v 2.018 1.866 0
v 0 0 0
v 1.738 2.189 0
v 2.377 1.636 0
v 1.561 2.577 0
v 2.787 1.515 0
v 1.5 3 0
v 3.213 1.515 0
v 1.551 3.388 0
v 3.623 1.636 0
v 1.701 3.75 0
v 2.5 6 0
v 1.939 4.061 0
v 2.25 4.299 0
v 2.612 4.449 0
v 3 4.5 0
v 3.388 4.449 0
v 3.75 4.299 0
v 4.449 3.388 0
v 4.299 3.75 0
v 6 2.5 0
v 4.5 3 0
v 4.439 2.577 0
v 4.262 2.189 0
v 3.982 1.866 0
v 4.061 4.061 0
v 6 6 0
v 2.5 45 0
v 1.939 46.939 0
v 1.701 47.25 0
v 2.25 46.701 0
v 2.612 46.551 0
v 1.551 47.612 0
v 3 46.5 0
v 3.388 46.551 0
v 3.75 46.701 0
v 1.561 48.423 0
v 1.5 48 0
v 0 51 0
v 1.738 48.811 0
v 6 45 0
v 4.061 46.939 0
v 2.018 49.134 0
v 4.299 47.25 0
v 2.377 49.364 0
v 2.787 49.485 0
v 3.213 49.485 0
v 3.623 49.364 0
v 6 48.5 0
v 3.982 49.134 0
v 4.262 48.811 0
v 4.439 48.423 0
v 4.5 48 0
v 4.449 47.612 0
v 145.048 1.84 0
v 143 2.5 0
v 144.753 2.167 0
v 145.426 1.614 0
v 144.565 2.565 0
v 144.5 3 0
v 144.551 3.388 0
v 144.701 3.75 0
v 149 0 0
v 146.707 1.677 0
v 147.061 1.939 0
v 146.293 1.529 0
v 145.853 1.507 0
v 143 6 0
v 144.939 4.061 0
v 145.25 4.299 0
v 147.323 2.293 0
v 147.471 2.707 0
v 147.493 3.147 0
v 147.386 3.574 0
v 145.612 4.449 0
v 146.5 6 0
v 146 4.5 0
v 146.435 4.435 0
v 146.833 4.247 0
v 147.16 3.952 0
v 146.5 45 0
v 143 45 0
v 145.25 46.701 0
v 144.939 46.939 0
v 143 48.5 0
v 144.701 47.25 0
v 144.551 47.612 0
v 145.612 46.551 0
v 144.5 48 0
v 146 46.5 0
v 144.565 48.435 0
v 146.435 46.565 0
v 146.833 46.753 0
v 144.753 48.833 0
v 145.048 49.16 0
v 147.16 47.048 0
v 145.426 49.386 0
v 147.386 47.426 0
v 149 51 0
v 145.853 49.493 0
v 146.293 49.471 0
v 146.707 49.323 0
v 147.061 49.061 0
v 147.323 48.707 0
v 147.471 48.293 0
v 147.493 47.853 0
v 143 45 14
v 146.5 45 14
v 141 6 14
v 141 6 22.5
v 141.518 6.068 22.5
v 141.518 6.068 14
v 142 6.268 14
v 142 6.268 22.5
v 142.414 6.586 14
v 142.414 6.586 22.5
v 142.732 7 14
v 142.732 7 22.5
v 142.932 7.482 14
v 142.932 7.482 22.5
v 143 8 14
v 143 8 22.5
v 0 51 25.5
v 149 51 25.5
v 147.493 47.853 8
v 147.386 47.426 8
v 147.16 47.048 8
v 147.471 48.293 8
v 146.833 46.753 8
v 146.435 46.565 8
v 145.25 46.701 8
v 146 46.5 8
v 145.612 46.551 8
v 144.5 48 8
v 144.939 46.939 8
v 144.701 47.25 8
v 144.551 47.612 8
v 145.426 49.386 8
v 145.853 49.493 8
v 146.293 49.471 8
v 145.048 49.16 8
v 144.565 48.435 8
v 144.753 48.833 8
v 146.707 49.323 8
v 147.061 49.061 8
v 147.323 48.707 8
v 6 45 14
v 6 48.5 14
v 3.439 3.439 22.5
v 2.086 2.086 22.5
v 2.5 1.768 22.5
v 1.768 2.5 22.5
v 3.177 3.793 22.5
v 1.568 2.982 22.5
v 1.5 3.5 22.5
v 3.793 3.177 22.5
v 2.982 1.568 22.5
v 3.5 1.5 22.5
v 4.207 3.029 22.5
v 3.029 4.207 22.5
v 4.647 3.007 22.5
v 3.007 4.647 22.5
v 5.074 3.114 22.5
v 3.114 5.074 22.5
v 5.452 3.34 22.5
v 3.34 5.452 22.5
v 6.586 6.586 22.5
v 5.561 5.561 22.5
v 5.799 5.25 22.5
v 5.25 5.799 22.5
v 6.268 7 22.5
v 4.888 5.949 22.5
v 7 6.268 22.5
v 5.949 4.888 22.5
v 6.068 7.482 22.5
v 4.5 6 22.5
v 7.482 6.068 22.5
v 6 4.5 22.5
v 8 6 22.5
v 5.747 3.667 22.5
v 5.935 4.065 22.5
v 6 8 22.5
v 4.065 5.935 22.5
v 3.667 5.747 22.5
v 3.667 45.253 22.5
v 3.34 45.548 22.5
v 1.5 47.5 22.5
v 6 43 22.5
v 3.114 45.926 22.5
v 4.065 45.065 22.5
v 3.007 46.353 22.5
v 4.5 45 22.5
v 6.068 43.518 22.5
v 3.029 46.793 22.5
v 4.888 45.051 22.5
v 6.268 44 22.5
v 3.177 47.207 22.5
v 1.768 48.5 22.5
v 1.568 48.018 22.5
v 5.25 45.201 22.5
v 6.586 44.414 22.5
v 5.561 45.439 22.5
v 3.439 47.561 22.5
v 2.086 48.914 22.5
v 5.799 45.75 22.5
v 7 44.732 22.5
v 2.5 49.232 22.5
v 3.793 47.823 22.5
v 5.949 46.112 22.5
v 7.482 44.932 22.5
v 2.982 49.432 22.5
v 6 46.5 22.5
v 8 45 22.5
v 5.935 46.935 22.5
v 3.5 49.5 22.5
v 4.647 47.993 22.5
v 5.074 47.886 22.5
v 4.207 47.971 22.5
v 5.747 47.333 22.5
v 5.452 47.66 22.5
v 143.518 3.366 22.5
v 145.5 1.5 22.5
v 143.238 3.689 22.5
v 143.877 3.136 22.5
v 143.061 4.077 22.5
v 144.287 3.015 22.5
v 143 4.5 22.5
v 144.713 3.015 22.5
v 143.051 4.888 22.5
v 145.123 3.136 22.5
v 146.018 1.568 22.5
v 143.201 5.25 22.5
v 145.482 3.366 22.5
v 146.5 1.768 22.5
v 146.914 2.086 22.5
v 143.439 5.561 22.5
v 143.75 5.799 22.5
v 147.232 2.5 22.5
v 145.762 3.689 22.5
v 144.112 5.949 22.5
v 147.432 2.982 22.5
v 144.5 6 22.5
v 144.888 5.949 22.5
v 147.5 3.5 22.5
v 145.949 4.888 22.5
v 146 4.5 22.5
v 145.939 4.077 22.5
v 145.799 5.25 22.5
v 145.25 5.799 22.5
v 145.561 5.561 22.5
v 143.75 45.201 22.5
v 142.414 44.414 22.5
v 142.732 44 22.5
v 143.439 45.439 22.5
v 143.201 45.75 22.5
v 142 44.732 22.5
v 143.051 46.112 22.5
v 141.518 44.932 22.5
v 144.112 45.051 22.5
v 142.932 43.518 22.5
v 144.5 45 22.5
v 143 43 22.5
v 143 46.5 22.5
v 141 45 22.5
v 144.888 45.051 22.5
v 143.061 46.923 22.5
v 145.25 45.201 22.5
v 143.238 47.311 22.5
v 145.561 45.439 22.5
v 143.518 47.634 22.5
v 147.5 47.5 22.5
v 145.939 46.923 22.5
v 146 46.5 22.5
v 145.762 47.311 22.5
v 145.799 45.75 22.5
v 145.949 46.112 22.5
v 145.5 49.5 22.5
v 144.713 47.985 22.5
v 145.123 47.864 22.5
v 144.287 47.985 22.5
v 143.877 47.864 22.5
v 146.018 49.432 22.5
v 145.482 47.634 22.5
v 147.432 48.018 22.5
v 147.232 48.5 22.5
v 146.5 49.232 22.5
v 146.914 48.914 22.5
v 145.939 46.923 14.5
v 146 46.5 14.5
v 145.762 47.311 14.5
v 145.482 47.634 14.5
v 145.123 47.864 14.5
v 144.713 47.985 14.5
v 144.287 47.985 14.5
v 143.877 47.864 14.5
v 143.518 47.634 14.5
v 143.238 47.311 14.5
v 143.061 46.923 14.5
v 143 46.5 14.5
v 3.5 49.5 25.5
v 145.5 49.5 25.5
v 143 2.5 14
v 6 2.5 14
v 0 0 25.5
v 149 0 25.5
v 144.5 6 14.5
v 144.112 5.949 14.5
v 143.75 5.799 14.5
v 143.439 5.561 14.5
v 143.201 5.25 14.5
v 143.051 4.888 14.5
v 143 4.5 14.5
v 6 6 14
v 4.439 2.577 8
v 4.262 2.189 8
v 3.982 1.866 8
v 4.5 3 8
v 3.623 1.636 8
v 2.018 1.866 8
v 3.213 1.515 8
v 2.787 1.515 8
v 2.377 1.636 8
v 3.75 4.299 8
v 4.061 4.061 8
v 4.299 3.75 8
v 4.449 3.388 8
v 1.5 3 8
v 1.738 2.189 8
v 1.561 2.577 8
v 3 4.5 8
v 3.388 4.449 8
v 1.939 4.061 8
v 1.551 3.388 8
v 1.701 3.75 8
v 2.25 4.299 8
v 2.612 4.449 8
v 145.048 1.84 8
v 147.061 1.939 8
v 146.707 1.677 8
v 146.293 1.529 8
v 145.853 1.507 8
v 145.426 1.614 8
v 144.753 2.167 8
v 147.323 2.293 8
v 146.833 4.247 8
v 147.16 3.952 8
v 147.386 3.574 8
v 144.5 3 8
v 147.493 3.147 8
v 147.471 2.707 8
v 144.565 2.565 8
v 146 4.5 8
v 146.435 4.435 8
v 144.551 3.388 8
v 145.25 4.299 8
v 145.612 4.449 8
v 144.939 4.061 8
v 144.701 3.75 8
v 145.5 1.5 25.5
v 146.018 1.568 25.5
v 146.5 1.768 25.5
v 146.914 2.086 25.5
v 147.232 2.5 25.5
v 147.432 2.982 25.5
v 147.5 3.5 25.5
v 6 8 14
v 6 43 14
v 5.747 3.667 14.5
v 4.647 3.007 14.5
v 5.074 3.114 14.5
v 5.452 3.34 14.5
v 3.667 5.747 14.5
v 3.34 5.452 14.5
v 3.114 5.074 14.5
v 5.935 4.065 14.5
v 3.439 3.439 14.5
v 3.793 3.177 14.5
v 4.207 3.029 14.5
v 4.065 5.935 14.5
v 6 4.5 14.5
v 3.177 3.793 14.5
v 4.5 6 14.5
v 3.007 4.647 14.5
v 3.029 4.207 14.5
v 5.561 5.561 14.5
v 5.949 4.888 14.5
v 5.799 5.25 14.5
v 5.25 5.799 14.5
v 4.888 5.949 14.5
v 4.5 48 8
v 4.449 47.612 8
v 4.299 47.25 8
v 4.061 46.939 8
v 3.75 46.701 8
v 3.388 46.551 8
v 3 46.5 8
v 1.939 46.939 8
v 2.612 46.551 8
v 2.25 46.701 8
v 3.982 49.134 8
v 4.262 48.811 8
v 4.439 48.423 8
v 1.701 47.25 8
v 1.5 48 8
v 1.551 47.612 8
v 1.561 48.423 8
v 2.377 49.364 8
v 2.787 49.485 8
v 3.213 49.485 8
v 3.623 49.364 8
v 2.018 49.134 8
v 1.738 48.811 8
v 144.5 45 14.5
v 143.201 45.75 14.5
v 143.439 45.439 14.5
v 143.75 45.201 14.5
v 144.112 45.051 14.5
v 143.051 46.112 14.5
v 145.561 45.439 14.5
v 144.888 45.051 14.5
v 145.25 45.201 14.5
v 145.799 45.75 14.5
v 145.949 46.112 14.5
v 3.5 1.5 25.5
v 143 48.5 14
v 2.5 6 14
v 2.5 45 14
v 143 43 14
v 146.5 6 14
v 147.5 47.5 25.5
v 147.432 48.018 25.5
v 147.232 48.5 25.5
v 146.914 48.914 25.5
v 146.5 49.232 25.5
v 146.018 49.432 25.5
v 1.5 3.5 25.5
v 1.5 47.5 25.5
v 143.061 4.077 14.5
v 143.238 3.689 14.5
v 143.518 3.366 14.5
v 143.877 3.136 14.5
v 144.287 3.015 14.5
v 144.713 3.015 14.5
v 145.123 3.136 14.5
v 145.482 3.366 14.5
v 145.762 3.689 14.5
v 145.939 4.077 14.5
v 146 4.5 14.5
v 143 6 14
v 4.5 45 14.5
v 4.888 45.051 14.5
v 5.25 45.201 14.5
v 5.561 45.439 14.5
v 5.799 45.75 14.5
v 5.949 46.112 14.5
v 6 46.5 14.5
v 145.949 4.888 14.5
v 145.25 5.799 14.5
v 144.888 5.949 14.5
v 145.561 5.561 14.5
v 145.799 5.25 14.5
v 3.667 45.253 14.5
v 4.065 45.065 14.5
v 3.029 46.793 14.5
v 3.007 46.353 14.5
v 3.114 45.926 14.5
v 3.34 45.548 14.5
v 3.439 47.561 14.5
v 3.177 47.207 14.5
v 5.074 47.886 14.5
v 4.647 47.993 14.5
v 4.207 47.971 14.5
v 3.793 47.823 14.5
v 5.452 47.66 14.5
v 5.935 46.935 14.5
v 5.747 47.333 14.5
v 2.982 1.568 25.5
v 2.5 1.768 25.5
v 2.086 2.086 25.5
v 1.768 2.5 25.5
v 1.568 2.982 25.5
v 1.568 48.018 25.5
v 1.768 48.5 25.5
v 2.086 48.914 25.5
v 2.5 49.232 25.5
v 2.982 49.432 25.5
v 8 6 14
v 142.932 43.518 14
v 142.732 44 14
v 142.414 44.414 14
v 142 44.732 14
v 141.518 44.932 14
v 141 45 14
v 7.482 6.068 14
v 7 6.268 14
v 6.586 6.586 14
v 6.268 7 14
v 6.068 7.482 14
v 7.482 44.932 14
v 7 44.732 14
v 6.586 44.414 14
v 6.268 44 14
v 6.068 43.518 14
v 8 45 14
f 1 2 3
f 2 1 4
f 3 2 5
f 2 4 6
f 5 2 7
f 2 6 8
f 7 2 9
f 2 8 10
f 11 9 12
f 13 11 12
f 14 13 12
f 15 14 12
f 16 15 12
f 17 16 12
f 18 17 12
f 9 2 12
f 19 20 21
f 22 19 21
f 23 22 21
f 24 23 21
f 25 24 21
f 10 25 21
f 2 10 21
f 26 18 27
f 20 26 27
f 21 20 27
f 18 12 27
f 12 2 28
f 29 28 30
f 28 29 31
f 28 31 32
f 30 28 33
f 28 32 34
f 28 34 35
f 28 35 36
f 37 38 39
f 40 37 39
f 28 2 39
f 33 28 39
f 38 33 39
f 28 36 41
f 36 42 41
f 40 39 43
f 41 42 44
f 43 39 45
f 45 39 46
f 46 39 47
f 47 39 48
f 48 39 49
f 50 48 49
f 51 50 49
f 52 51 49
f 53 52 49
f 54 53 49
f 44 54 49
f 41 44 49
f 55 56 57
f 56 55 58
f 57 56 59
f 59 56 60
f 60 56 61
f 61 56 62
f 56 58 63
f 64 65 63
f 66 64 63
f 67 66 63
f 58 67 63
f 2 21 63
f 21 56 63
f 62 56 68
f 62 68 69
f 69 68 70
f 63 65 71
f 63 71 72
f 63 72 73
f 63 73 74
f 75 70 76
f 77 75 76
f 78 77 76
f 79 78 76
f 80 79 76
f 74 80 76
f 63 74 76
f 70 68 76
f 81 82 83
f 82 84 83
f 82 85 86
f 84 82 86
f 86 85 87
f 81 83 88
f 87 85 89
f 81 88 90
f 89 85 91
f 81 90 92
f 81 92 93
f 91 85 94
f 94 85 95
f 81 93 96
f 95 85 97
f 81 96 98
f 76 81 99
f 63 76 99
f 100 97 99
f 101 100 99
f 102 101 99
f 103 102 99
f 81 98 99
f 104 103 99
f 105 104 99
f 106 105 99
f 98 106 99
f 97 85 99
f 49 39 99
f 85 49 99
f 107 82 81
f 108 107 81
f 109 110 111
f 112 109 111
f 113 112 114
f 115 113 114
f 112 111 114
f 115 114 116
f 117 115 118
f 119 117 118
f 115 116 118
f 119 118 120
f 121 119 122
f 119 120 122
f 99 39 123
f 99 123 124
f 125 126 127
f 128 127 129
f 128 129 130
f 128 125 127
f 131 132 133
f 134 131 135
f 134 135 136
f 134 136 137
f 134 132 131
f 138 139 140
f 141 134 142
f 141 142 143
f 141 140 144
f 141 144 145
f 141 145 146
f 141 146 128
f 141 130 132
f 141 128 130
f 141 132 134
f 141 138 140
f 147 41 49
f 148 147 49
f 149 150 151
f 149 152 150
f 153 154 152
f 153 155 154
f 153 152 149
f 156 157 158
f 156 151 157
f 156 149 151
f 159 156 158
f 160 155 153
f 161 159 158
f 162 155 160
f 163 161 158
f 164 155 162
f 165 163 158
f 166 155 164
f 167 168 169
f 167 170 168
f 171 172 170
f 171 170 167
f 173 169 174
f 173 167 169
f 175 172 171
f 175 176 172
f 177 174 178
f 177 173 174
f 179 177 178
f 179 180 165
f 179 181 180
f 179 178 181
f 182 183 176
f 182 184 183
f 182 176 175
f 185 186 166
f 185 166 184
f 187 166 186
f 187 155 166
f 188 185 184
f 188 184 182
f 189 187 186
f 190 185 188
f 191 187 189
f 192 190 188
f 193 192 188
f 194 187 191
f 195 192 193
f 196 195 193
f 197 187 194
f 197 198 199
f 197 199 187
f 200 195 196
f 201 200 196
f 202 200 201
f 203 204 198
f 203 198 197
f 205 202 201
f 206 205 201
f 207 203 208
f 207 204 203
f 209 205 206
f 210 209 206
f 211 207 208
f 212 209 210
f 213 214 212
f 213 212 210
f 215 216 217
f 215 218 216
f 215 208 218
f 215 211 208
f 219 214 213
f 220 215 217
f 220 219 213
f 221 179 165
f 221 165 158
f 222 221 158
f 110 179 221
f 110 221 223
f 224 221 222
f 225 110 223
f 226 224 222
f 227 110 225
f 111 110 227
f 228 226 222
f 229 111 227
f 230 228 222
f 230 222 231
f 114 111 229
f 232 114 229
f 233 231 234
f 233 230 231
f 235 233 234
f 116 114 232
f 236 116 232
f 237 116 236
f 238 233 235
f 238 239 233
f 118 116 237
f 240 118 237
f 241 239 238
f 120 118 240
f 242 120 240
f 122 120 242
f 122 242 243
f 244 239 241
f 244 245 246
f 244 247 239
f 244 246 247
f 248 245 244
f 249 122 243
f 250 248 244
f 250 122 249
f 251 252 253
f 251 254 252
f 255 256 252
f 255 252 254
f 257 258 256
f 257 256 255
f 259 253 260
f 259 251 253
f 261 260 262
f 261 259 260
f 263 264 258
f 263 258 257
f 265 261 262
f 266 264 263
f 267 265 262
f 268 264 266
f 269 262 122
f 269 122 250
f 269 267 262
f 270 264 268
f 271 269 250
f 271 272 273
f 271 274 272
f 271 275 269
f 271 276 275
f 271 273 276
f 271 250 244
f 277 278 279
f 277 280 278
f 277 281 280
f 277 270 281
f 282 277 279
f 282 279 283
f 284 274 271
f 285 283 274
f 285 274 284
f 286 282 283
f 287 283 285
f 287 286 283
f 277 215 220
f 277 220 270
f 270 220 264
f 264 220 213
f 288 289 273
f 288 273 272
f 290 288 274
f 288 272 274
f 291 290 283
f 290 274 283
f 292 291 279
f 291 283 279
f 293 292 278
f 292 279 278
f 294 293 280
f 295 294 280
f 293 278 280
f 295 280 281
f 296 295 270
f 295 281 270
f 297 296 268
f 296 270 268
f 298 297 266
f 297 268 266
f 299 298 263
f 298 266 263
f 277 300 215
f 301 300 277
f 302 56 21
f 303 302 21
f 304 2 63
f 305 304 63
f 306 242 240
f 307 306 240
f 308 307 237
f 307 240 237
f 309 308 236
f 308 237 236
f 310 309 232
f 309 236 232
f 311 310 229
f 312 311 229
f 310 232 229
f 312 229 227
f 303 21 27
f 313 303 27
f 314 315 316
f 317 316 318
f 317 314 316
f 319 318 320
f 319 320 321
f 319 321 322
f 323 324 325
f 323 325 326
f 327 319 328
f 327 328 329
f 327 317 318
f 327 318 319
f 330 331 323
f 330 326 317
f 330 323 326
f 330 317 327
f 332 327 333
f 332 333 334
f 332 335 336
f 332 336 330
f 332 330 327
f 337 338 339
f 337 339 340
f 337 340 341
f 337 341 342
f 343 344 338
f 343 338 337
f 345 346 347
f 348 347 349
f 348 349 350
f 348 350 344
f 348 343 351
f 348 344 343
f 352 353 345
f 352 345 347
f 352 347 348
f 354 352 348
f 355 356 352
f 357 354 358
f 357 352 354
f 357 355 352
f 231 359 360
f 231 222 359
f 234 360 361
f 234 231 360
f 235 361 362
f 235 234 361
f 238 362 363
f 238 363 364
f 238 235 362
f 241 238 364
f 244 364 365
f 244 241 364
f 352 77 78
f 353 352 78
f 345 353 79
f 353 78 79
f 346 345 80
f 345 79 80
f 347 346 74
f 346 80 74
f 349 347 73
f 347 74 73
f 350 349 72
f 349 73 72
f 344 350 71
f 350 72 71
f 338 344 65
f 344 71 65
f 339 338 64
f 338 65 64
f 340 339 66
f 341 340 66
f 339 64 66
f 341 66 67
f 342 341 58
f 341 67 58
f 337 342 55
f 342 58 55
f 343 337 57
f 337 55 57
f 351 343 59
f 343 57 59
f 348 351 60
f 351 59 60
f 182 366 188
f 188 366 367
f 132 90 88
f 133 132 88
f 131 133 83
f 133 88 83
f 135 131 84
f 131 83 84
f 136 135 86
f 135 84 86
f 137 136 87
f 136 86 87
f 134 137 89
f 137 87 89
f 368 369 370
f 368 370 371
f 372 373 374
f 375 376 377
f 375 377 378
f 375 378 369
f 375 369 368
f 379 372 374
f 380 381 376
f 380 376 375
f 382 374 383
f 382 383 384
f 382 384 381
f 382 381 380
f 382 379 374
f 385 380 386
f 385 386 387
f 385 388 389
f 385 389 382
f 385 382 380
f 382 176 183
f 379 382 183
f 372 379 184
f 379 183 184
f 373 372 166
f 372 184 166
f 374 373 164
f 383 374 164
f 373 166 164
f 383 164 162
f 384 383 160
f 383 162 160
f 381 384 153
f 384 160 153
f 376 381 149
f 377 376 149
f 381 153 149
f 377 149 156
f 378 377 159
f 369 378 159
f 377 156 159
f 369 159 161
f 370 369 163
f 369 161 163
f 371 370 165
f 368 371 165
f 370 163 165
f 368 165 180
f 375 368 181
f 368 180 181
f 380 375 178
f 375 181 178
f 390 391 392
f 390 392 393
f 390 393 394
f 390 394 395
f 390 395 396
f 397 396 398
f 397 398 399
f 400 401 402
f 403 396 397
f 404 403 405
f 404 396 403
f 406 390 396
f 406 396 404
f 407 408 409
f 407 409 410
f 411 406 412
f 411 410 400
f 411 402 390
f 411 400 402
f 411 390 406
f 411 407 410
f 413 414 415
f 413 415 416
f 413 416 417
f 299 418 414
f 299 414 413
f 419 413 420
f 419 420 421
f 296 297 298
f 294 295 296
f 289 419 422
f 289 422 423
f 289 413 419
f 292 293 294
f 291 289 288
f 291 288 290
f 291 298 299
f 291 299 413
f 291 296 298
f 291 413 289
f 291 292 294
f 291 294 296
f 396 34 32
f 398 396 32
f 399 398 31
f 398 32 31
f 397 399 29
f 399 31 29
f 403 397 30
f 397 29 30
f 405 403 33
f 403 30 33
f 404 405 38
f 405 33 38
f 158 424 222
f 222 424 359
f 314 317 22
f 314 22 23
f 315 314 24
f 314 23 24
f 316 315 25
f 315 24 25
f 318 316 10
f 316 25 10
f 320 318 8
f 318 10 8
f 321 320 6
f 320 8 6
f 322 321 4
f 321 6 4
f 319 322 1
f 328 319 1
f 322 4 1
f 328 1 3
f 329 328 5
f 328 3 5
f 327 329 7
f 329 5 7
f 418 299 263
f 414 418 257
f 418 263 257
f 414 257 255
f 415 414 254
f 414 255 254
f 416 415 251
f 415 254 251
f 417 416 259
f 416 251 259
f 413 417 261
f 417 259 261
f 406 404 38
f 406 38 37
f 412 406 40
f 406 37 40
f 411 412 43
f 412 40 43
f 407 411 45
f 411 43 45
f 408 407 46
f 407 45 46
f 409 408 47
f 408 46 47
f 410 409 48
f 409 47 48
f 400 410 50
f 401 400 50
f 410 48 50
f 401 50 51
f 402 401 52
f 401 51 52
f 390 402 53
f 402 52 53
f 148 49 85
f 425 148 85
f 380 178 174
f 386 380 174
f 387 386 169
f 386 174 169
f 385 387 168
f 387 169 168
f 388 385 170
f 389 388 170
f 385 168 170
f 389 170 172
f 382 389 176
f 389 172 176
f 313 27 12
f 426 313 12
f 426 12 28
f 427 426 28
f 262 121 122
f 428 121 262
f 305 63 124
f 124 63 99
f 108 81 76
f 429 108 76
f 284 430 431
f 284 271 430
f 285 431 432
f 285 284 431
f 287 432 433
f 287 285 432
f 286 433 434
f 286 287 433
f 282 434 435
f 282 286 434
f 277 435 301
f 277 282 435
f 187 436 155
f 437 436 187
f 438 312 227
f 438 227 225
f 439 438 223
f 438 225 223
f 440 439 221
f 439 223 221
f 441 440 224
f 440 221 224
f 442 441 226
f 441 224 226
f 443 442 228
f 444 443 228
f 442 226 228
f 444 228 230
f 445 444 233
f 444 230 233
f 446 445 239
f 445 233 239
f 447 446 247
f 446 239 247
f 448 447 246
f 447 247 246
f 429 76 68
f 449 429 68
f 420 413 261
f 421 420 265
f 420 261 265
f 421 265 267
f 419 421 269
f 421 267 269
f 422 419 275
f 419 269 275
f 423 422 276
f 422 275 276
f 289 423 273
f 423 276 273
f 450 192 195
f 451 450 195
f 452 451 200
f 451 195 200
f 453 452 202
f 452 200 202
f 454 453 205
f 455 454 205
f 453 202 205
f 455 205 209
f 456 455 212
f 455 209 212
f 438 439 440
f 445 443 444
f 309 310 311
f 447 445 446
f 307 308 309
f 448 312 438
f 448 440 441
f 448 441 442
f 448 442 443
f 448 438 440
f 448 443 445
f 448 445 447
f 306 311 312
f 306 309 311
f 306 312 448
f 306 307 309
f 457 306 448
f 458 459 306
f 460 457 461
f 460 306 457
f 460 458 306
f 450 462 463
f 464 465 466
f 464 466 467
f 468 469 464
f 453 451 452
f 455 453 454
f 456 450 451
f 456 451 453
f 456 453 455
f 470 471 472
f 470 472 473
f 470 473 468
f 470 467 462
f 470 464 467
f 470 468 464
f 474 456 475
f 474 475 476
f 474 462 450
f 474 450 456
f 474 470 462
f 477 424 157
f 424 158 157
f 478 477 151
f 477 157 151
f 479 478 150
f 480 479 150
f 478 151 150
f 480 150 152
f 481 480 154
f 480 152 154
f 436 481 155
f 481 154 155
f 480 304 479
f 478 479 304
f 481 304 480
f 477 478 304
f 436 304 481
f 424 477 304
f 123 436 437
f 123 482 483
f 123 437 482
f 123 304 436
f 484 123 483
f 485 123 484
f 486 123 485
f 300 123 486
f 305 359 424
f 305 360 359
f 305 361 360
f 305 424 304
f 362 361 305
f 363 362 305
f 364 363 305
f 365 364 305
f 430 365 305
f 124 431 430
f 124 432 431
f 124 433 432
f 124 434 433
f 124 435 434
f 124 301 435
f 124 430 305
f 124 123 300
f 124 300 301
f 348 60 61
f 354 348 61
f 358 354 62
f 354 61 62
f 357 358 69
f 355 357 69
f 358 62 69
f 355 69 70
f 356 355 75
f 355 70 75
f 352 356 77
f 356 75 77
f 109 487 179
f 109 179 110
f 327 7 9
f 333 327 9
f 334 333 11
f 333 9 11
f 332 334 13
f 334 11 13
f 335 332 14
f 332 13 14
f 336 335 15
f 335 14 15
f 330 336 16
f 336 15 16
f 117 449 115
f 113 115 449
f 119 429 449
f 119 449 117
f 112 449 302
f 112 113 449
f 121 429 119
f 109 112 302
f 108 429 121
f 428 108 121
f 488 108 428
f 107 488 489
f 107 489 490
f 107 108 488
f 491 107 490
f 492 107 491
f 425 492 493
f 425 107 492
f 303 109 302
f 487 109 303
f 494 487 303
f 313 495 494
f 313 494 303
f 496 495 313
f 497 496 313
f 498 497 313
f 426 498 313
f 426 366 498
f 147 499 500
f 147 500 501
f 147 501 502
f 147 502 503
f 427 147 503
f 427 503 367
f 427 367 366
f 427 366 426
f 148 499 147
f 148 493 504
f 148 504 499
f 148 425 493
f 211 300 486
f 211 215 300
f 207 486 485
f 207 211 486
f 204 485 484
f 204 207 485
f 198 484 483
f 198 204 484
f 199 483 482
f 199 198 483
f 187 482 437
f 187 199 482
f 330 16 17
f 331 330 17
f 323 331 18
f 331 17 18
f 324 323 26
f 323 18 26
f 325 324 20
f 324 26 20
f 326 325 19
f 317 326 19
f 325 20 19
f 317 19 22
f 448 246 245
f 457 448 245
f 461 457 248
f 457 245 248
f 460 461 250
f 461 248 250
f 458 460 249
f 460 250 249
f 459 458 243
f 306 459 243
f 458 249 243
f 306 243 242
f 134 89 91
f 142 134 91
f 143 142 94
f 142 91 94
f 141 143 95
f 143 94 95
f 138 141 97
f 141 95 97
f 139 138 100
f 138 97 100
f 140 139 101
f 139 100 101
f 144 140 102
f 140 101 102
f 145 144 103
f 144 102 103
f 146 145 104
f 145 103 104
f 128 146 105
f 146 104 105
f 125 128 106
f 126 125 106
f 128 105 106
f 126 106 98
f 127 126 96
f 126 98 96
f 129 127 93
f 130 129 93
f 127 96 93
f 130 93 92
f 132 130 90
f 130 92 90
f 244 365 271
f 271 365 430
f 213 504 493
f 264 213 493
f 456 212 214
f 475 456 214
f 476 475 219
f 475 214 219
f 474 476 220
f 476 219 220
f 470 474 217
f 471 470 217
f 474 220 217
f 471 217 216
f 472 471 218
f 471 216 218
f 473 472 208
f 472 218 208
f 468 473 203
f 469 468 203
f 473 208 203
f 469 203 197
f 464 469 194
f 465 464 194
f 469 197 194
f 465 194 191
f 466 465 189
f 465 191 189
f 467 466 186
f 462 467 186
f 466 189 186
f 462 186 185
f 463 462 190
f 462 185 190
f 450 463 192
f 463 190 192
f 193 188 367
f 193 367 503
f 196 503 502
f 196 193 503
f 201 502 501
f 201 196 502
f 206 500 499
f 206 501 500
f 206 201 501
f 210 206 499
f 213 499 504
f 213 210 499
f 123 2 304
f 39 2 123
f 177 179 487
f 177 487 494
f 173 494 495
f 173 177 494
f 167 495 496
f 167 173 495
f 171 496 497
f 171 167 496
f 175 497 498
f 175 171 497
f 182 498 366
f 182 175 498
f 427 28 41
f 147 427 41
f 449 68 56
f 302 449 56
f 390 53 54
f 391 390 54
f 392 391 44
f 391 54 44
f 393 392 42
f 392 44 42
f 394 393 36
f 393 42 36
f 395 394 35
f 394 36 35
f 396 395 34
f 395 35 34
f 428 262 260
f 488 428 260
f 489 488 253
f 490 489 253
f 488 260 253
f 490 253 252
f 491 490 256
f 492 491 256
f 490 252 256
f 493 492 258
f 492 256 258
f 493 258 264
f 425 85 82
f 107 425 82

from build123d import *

# Parameters (mm, degrees)
SKETCH1_W           = 149
SKETCH1_H           = 51
SKETCH1_W_2         = 137
SKETCH1_H_2         = 39
EXTRUDE_THIN1_DEPTH = 25.5
SKETCH2_W           = 146
SKETCH2_H           = 48
CUT_EXTRUDE1_DEPTH  = 3
CUT_EXTRUDE2_DEPTH  = 8
CUT_EXTRUDE3_DEPTH  = 8
FILLET1_R           = 2
FILLET2_R           = 2
CUT_EXTRUDE7_DEPTH  = 14


with BuildPart() as part:
    # Sketch1 → Extrude-Thin1 (new body)
    with BuildSketch(Plane.XY):
        with Locations((74.5, 25.5)):
            Rectangle(SKETCH1_W, SKETCH1_H)
        with Locations((74.5, 25.5)):
            Rectangle(SKETCH1_W_2, SKETCH1_H_2, mode=Mode.SUBTRACT)
    extrude(amount=EXTRUDE_THIN1_DEPTH)

    # Sketch2 → Cut-Extrude1 (cut)
    with BuildSketch(Plane.XY.offset(25.5)):
        with Locations((74.5, 25.5)):
            Rectangle(SKETCH2_W, SKETCH2_H)
    extrude(amount=-CUT_EXTRUDE1_DEPTH, mode=Mode.SUBTRACT)

    # Sketch3 → Cut-Extrude2 (cut)
    with BuildSketch(Plane.XY.offset(22.5)):
        with BuildLine():
            ThreePointArc((4.5, 45), (5.560660172, 45.439339828), (6, 46.5))
            Line((6, 46.5), (4.5, 46.5))
            Line((4.5, 46.5), (4.5, 45))
        make_face()
        with BuildLine():
            Line((4.5, 46.5), (6, 46.5))
            ThreePointArc((6, 46.5), (3.439339828, 47.560660172), (4.5, 45))
            Line((4.5, 45), (4.5, 46.5))
        make_face()
        with BuildLine():
            ThreePointArc((4.5, 45), (5.560660172, 45.439339828), (6, 46.5))
            Line((6, 46.5), (4.5, 46.5))
            Line((4.5, 46.5), (4.5, 45))
        make_face()
        with BuildLine():
            Line((4.5, 46.5), (6, 46.5))
            ThreePointArc((6, 46.5), (3.439339828, 47.560660172), (4.5, 45))
            Line((4.5, 45), (4.5, 46.5))
        make_face()
        with BuildLine():
            ThreePointArc((6, 4.5), (5.560660172, 5.560660172), (4.5, 6))
            Line((4.5, 6), (4.5, 4.5))
            Line((4.5, 4.5), (6, 4.5))
        make_face()
        with BuildLine():
            Line((4.5, 4.5), (4.5, 6))
            ThreePointArc((4.5, 6), (3.439339828, 3.439339828), (6, 4.5))
            Line((6, 4.5), (4.5, 4.5))
        make_face()
        with BuildLine():
            ThreePointArc((6, 4.5), (5.560660172, 5.560660172), (4.5, 6))
            Line((4.5, 6), (4.5, 4.5))
            Line((4.5, 4.5), (6, 4.5))
        make_face()
        with BuildLine():
            Line((4.5, 4.5), (4.5, 6))
            ThreePointArc((4.5, 6), (3.439339828, 3.439339828), (6, 4.5))
            Line((6, 4.5), (4.5, 4.5))
        make_face()
        with BuildLine():
            ThreePointArc((146, 46.5), (144.5, 48), (143, 46.5))
            Line((143, 46.5), (144.5, 46.5))
            Line((144.5, 46.5), (144.5, 45))
            ThreePointArc((144.5, 45), (145.560660172, 45.439339828), (146, 46.5))
        make_face()
        with BuildLine():
            Line((144.5, 46.5), (143, 46.5))
            ThreePointArc((143, 46.5), (143.439339828, 45.439339828), (144.5, 45))
            Line((144.5, 45), (144.5, 46.5))
        make_face()
        with BuildLine():
            ThreePointArc((146, 46.5), (144.5, 48), (143, 46.5))
            Line((143, 46.5), (144.5, 46.5))
            Line((144.5, 46.5), (144.5, 45))
            ThreePointArc((144.5, 45), (145.560660172, 45.439339828), (146, 46.5))
        make_face()
        with BuildLine():
            Line((144.5, 46.5), (143, 46.5))
            ThreePointArc((143, 46.5), (143.439339828, 45.439339828), (144.5, 45))
            Line((144.5, 45), (144.5, 46.5))
        make_face()
        with BuildLine():
            ThreePointArc((146, 4.5), (145.560660172, 5.560660172), (144.5, 6))
            Line((144.5, 6), (144.5, 4.5))
            Line((144.5, 4.5), (143, 4.5))
            ThreePointArc((143, 4.5), (144.5, 3), (146, 4.5))
        make_face()
        with BuildLine():
            Line((144.5, 4.5), (144.5, 6))
            ThreePointArc((144.5, 6), (143.439339828, 5.560660172), (143, 4.5))
            Line((143, 4.5), (144.5, 4.5))
        make_face()
        with BuildLine():
            ThreePointArc((146, 4.5), (145.560660172, 5.560660172), (144.5, 6))
            Line((144.5, 6), (144.5, 4.5))
            Line((144.5, 4.5), (143, 4.5))
            ThreePointArc((143, 4.5), (144.5, 3), (146, 4.5))
        make_face()
        with BuildLine():
            Line((144.5, 4.5), (144.5, 6))
            ThreePointArc((144.5, 6), (143.439339828, 5.560660172), (143, 4.5))
            Line((143, 4.5), (144.5, 4.5))
        make_face()
    extrude(amount=-CUT_EXTRUDE2_DEPTH, mode=Mode.SUBTRACT)

    # Sketch4 → Cut-Extrude3 (cut)
    with BuildSketch(Plane(origin=(0, 0, 0), x_dir=(-1, 0, 0), z_dir=(0, 0, -1))):
        with BuildLine():
            ThreePointArc((-146, 46.5), (-144.939339828, 46.939339828), (-144.5, 48))
            Line((-144.5, 48), (-146, 48))
            Line((-146, 48), (-146, 46.5))
        make_face()
        with BuildLine():
            Line((-146, 48), (-144.5, 48))
            ThreePointArc((-144.5, 48), (-147.060660172, 49.060660172), (-146, 46.5))
            Line((-146, 46.5), (-146, 48))
        make_face()
        with BuildLine():
            ThreePointArc((-146, 4.5), (-147.060660172, 1.939339828), (-144.5, 3))
            Line((-144.5, 3), (-146, 3))
            Line((-146, 3), (-146, 4.5))
        make_face()
        with BuildLine():
            Line((-146, 3), (-144.5, 3))
            ThreePointArc((-144.5, 3), (-144.939339828, 4.060660172), (-146, 4.5))
            Line((-146, 4.5), (-146, 3))
        make_face()
        with BuildLine():
            ThreePointArc((-146, 4.5), (-147.060660172, 1.939339828), (-144.5, 3))
            Line((-144.5, 3), (-146, 3))
            Line((-146, 3), (-146, 4.5))
        make_face()
        with BuildLine():
            Line((-146, 3), (-144.5, 3))
            ThreePointArc((-144.5, 3), (-144.939339828, 4.060660172), (-146, 4.5))
            Line((-146, 4.5), (-146, 3))
        make_face()
        with BuildLine():
            ThreePointArc((-146, 46.5), (-144.939339828, 46.939339828), (-144.5, 48))
            Line((-144.5, 48), (-146, 48))
            Line((-146, 48), (-146, 46.5))
        make_face()
        with BuildLine():
            Line((-146, 48), (-144.5, 48))
            ThreePointArc((-144.5, 48), (-147.060660172, 49.060660172), (-146, 46.5))
            Line((-146, 46.5), (-146, 48))
        make_face()
        with BuildLine():
            ThreePointArc((-4.5, 48), (-4.060660172, 46.939339828), (-3, 46.5))
            Line((-3, 46.5), (-3, 48))
            Line((-3, 48), (-4.5, 48))
        make_face()
        with BuildLine():
            Line((-3, 48), (-3, 46.5))
            ThreePointArc((-3, 46.5), (-1.939339828, 46.939339828), (-1.5, 48))
            ThreePointArc((-1.5, 48), (-3, 49.5), (-4.5, 48))
            Line((-4.5, 48), (-3, 48))
        make_face()
        with BuildLine():
            ThreePointArc((-4.5, 48), (-4.060660172, 46.939339828), (-3, 46.5))
            Line((-3, 46.5), (-3, 48))
            Line((-3, 48), (-4.5, 48))
        make_face()
        with BuildLine():
            Line((-3, 48), (-3, 46.5))
            ThreePointArc((-3, 46.5), (-1.939339828, 46.939339828), (-1.5, 48))
            ThreePointArc((-1.5, 48), (-3, 49.5), (-4.5, 48))
            Line((-4.5, 48), (-3, 48))
        make_face()
        with BuildLine():
            Line((-4.5, 3), (-3, 3))
            Line((-3, 3), (-3, 4.5))
            ThreePointArc((-3, 4.5), (-4.060660172, 4.060660172), (-4.5, 3))
        make_face()
        with BuildLine():
            Line((-3, 4.5), (-3, 3))
            Line((-3, 3), (-4.5, 3))
            ThreePointArc((-4.5, 3), (-3, 1.5), (-1.5, 3))
            ThreePointArc((-1.5, 3), (-1.939339828, 4.060660172), (-3, 4.5))
        make_face()
        with BuildLine():
            Line((-4.5, 3), (-3, 3))
            Line((-3, 3), (-3, 4.5))
            ThreePointArc((-3, 4.5), (-4.060660172, 4.060660172), (-4.5, 3))
        make_face()
        with BuildLine():
            Line((-3, 4.5), (-3, 3))
            Line((-3, 3), (-4.5, 3))
            ThreePointArc((-4.5, 3), (-3, 1.5), (-1.5, 3))
            ThreePointArc((-1.5, 3), (-1.939339828, 4.060660172), (-3, 4.5))
        make_face()
    extrude(amount=-CUT_EXTRUDE3_DEPTH, mode=Mode.SUBTRACT)

    # Fillet1
    fillet1_edges = [part.edges().sort_by_distance(p)[0] for p in [
        (1.5, 49.5, 24),
        (147.5, 49.5, 24),
        (147.5, 1.5, 24),
        (1.5, 1.5, 24),
    ]]
    fillet(fillet1_edges, radius=FILLET1_R)

    # Fillet2
    fillet2_edges = [part.edges().sort_by_distance(p)[0] for p in [
        (143, 45, 11.25),
        (6, 45, 11.25),
        (143, 6, 11.25),
        (6, 6, 11.25),
    ]]
    fillet(fillet2_edges, radius=FILLET2_R)

    # Sketch6 → Cut-Extrude7 (cut)
    with BuildSketch(Plane(origin=(0, 0, 0), x_dir=(-1, 0, 0), z_dir=(0, 0, -1))):
        Polygon((-143, 45), (-146.5, 45), (-146.5, 6), (-143, 6), (-143, 2.5), (-6, 2.5), (-6, 6), (-2.5, 6), (-2.5, 45), (-6, 45), (-6, 48.5), (-143, 48.5), align=None)
    extrude(amount=-CUT_EXTRUDE7_DEPTH, mode=Mode.SUBTRACT)


solid = part.part
